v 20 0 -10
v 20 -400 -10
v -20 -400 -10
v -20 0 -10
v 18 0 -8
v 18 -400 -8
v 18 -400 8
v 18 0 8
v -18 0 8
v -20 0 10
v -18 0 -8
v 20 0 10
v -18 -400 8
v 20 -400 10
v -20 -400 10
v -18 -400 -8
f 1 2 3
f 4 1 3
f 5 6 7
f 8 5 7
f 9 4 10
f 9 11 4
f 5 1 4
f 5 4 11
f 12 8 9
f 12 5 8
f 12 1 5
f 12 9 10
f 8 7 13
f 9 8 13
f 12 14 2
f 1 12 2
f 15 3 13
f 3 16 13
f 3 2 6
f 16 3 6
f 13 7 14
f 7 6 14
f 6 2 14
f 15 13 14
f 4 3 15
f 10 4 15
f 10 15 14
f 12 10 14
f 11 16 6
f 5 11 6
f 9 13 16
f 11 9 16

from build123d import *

# Parameters (mm, degrees)
ESBO_O1_W   = 40
ESBO_O1_H   = 20
ESBO_O1_W_2 = 36
ESBO_O1_H_2 = 16


with BuildPart() as part:
    # Varredura1: sweep along a path in Esboço2
    with BuildLine(Plane(origin=(0, 0, 0), x_dir=(0, 0, -1), z_dir=(1, 0, 0))) as varredura1_path:
        Line((0, 0), (0, -400))
    # Esboço1 → Varredura1 (sweep)
    with BuildSketch(Plane(origin=(0, 0, 0), x_dir=(1, 0, 0), z_dir=(0, 1, 0))):
        Rectangle(ESBO_O1_W, ESBO_O1_H)
        Rectangle(ESBO_O1_W_2, ESBO_O1_H_2, mode=Mode.SUBTRACT)
    sweep(path=varredura1_path.line)


solid = part.part
